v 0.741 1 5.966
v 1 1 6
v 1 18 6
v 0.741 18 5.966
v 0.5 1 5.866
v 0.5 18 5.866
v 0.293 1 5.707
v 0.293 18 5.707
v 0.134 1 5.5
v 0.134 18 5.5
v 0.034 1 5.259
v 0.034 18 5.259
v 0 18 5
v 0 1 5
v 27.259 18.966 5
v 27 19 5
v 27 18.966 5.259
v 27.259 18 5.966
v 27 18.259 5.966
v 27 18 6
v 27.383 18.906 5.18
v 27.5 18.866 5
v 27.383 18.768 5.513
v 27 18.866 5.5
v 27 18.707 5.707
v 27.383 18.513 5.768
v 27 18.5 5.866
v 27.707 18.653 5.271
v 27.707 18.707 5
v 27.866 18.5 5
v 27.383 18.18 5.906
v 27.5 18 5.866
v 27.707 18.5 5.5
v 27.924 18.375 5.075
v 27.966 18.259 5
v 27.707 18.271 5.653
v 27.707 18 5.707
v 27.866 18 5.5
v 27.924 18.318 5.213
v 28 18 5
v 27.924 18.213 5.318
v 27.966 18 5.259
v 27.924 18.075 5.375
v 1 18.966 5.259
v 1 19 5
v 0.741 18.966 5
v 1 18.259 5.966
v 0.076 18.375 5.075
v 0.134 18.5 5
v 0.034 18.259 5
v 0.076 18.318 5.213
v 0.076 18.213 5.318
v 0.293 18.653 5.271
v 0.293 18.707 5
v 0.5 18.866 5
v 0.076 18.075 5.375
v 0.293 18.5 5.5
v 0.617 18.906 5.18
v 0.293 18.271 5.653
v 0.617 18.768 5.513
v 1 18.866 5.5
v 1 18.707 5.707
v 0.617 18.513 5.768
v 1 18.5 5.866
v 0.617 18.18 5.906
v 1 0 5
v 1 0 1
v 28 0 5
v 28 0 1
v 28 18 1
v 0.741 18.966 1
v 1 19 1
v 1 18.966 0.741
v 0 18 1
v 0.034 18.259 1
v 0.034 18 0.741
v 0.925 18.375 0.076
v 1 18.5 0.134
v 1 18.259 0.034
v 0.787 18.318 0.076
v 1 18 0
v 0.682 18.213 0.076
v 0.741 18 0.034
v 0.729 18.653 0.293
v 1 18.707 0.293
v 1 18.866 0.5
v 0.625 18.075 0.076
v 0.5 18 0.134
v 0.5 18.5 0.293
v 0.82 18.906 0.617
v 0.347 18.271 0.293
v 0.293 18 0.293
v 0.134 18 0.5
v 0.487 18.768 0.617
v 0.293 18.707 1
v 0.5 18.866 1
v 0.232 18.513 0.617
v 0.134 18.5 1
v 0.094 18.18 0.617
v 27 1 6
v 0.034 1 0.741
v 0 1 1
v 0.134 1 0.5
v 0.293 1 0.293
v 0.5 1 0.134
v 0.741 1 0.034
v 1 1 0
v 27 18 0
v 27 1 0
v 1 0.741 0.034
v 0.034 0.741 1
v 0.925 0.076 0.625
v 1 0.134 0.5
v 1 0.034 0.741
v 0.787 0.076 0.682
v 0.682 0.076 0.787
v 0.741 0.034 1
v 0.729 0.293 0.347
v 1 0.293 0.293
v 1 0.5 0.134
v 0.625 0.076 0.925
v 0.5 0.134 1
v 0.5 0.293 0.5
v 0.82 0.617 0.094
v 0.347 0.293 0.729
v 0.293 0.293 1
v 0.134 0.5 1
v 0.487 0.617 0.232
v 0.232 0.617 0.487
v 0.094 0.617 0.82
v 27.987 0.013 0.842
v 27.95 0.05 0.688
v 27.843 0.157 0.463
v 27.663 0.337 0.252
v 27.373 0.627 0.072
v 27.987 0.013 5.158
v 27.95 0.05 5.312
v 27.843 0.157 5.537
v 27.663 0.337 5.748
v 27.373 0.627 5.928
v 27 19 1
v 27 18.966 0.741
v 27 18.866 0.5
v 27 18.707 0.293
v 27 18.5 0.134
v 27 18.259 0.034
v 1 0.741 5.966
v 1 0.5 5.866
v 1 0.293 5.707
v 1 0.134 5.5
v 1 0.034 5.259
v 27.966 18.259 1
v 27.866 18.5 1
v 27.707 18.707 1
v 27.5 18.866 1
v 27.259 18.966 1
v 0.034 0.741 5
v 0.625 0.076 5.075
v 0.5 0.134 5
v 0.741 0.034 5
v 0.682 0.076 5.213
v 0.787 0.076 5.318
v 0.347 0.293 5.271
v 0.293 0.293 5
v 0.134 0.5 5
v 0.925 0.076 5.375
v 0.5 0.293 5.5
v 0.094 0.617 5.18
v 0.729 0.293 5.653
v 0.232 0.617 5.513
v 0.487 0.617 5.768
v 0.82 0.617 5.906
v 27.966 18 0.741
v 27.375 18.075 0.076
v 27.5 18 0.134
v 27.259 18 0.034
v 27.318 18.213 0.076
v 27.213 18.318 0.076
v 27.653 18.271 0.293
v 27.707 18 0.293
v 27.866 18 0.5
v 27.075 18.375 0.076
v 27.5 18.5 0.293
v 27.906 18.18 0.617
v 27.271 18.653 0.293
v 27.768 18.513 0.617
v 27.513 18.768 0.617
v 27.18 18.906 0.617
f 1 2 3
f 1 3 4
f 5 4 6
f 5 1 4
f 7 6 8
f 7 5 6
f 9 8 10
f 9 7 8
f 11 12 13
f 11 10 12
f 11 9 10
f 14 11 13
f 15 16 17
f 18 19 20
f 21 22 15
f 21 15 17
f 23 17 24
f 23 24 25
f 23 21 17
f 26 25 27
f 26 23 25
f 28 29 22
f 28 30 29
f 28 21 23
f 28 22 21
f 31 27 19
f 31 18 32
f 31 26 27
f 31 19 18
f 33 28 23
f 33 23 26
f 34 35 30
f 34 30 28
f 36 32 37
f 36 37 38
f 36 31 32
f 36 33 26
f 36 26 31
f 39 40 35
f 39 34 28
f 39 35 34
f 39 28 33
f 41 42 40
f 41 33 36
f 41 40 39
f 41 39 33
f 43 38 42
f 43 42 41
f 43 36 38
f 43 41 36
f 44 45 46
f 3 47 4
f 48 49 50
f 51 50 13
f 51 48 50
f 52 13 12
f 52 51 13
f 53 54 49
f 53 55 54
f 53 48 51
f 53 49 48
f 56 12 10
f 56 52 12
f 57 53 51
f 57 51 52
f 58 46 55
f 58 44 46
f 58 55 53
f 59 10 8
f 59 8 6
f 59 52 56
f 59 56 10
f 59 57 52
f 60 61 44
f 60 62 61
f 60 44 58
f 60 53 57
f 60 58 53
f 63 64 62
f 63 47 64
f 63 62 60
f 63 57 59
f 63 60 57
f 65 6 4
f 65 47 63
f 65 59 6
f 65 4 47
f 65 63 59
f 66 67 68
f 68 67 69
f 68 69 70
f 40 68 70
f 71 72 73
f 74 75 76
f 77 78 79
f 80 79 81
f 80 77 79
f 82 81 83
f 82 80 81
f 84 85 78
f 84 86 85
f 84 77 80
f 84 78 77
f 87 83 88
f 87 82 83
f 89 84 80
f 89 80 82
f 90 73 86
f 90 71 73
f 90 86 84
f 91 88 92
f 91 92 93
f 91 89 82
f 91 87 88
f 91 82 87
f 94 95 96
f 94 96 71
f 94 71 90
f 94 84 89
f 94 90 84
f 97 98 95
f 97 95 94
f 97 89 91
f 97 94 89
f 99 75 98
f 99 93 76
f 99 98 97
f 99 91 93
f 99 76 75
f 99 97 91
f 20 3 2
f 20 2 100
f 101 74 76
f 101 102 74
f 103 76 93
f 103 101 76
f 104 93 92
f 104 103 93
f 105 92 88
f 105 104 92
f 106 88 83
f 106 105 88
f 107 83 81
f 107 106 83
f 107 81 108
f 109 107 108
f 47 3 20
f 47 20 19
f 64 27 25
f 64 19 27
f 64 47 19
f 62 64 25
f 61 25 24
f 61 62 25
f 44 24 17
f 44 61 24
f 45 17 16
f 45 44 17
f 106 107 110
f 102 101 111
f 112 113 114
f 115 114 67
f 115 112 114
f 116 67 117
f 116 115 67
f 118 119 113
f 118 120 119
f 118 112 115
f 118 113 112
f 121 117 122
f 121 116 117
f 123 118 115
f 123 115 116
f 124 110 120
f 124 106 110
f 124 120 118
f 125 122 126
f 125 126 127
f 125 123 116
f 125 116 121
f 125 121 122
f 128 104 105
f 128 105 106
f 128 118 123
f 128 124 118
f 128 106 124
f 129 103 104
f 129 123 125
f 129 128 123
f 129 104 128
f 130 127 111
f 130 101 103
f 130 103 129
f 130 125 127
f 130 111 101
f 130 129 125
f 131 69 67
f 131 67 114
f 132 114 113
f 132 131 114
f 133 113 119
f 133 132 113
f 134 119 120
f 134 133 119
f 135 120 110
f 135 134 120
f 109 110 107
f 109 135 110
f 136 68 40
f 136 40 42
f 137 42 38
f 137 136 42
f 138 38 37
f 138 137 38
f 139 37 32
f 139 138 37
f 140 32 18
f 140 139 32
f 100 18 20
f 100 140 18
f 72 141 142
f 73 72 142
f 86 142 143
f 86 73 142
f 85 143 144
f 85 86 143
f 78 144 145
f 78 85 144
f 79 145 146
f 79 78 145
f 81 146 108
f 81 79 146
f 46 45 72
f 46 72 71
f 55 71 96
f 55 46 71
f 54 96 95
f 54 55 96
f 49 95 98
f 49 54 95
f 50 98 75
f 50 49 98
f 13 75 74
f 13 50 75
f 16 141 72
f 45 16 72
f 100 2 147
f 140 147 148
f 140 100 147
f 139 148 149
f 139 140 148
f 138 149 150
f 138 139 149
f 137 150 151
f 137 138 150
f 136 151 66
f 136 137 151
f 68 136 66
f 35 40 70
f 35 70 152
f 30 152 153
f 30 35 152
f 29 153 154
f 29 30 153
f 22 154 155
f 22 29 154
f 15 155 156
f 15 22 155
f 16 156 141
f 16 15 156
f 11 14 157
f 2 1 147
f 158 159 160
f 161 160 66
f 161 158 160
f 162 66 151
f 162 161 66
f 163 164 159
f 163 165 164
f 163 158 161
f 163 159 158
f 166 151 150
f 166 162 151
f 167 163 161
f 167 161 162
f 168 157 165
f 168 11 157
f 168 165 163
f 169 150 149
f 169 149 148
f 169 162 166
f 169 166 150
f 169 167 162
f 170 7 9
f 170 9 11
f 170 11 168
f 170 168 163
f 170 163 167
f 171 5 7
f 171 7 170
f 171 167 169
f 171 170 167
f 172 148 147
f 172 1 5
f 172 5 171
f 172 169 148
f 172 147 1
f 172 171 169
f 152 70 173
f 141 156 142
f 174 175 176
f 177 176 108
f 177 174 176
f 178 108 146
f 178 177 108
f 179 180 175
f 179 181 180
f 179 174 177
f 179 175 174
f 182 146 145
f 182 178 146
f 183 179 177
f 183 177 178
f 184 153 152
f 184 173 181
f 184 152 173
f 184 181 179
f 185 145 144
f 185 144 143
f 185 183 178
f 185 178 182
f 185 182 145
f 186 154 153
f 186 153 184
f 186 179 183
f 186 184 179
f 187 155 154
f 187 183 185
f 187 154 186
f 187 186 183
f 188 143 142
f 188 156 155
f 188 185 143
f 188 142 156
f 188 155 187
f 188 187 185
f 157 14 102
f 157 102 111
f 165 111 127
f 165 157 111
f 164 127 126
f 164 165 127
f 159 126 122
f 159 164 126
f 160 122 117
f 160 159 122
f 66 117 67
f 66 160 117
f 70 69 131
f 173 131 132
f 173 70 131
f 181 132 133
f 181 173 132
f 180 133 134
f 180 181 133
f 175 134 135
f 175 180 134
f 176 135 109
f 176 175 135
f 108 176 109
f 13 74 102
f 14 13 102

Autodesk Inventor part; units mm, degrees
ref_plane "YZ Plane" through (0, 0, 0) normal (1, 0, 0) x (0, 1, 0)
ref_plane "XZ Plane" through (0, 0, 0) normal (0, 1, 0) x (-1, 0, 0)
ref_plane "XY Plane" through (0, 0, 0) normal (0, 0, 1) x (1, 0, 0)
sketch "Skizze1" plane through (0, 0, 0) normal (0, 0, 1) x (1, 0, 0)
  line L0 (0, 0) -> (28, 0)
  line L1 (28, 0) -> (28, 19)
  line L2 (28, 19) -> (0, 19)
  line L3 (0, 19) -> (0, 0)
  dimension "d0" = 28
  dimension "d1" = 19
extrude "Extrusion1" add sketch "Skizze1" along normal blind 6
fillet "Rundung1" radius 1 1 edges at (14, 19, 6)
fillet "Rundung2" radius 1 12 edges at (0, 9, 6) (0, 18.7071, 5.7071) (0, 19, 2.5) (14, 0, 6) (28, 18.7071, 5.7071) (28, 19, 2.5) (28, 9, 6) (0, 9.5, 0) (0, 0, 3) (14, 0, 0) (28, 9.5, 0) (14, 19, 0)
properties part number "LiPo_Akku"
